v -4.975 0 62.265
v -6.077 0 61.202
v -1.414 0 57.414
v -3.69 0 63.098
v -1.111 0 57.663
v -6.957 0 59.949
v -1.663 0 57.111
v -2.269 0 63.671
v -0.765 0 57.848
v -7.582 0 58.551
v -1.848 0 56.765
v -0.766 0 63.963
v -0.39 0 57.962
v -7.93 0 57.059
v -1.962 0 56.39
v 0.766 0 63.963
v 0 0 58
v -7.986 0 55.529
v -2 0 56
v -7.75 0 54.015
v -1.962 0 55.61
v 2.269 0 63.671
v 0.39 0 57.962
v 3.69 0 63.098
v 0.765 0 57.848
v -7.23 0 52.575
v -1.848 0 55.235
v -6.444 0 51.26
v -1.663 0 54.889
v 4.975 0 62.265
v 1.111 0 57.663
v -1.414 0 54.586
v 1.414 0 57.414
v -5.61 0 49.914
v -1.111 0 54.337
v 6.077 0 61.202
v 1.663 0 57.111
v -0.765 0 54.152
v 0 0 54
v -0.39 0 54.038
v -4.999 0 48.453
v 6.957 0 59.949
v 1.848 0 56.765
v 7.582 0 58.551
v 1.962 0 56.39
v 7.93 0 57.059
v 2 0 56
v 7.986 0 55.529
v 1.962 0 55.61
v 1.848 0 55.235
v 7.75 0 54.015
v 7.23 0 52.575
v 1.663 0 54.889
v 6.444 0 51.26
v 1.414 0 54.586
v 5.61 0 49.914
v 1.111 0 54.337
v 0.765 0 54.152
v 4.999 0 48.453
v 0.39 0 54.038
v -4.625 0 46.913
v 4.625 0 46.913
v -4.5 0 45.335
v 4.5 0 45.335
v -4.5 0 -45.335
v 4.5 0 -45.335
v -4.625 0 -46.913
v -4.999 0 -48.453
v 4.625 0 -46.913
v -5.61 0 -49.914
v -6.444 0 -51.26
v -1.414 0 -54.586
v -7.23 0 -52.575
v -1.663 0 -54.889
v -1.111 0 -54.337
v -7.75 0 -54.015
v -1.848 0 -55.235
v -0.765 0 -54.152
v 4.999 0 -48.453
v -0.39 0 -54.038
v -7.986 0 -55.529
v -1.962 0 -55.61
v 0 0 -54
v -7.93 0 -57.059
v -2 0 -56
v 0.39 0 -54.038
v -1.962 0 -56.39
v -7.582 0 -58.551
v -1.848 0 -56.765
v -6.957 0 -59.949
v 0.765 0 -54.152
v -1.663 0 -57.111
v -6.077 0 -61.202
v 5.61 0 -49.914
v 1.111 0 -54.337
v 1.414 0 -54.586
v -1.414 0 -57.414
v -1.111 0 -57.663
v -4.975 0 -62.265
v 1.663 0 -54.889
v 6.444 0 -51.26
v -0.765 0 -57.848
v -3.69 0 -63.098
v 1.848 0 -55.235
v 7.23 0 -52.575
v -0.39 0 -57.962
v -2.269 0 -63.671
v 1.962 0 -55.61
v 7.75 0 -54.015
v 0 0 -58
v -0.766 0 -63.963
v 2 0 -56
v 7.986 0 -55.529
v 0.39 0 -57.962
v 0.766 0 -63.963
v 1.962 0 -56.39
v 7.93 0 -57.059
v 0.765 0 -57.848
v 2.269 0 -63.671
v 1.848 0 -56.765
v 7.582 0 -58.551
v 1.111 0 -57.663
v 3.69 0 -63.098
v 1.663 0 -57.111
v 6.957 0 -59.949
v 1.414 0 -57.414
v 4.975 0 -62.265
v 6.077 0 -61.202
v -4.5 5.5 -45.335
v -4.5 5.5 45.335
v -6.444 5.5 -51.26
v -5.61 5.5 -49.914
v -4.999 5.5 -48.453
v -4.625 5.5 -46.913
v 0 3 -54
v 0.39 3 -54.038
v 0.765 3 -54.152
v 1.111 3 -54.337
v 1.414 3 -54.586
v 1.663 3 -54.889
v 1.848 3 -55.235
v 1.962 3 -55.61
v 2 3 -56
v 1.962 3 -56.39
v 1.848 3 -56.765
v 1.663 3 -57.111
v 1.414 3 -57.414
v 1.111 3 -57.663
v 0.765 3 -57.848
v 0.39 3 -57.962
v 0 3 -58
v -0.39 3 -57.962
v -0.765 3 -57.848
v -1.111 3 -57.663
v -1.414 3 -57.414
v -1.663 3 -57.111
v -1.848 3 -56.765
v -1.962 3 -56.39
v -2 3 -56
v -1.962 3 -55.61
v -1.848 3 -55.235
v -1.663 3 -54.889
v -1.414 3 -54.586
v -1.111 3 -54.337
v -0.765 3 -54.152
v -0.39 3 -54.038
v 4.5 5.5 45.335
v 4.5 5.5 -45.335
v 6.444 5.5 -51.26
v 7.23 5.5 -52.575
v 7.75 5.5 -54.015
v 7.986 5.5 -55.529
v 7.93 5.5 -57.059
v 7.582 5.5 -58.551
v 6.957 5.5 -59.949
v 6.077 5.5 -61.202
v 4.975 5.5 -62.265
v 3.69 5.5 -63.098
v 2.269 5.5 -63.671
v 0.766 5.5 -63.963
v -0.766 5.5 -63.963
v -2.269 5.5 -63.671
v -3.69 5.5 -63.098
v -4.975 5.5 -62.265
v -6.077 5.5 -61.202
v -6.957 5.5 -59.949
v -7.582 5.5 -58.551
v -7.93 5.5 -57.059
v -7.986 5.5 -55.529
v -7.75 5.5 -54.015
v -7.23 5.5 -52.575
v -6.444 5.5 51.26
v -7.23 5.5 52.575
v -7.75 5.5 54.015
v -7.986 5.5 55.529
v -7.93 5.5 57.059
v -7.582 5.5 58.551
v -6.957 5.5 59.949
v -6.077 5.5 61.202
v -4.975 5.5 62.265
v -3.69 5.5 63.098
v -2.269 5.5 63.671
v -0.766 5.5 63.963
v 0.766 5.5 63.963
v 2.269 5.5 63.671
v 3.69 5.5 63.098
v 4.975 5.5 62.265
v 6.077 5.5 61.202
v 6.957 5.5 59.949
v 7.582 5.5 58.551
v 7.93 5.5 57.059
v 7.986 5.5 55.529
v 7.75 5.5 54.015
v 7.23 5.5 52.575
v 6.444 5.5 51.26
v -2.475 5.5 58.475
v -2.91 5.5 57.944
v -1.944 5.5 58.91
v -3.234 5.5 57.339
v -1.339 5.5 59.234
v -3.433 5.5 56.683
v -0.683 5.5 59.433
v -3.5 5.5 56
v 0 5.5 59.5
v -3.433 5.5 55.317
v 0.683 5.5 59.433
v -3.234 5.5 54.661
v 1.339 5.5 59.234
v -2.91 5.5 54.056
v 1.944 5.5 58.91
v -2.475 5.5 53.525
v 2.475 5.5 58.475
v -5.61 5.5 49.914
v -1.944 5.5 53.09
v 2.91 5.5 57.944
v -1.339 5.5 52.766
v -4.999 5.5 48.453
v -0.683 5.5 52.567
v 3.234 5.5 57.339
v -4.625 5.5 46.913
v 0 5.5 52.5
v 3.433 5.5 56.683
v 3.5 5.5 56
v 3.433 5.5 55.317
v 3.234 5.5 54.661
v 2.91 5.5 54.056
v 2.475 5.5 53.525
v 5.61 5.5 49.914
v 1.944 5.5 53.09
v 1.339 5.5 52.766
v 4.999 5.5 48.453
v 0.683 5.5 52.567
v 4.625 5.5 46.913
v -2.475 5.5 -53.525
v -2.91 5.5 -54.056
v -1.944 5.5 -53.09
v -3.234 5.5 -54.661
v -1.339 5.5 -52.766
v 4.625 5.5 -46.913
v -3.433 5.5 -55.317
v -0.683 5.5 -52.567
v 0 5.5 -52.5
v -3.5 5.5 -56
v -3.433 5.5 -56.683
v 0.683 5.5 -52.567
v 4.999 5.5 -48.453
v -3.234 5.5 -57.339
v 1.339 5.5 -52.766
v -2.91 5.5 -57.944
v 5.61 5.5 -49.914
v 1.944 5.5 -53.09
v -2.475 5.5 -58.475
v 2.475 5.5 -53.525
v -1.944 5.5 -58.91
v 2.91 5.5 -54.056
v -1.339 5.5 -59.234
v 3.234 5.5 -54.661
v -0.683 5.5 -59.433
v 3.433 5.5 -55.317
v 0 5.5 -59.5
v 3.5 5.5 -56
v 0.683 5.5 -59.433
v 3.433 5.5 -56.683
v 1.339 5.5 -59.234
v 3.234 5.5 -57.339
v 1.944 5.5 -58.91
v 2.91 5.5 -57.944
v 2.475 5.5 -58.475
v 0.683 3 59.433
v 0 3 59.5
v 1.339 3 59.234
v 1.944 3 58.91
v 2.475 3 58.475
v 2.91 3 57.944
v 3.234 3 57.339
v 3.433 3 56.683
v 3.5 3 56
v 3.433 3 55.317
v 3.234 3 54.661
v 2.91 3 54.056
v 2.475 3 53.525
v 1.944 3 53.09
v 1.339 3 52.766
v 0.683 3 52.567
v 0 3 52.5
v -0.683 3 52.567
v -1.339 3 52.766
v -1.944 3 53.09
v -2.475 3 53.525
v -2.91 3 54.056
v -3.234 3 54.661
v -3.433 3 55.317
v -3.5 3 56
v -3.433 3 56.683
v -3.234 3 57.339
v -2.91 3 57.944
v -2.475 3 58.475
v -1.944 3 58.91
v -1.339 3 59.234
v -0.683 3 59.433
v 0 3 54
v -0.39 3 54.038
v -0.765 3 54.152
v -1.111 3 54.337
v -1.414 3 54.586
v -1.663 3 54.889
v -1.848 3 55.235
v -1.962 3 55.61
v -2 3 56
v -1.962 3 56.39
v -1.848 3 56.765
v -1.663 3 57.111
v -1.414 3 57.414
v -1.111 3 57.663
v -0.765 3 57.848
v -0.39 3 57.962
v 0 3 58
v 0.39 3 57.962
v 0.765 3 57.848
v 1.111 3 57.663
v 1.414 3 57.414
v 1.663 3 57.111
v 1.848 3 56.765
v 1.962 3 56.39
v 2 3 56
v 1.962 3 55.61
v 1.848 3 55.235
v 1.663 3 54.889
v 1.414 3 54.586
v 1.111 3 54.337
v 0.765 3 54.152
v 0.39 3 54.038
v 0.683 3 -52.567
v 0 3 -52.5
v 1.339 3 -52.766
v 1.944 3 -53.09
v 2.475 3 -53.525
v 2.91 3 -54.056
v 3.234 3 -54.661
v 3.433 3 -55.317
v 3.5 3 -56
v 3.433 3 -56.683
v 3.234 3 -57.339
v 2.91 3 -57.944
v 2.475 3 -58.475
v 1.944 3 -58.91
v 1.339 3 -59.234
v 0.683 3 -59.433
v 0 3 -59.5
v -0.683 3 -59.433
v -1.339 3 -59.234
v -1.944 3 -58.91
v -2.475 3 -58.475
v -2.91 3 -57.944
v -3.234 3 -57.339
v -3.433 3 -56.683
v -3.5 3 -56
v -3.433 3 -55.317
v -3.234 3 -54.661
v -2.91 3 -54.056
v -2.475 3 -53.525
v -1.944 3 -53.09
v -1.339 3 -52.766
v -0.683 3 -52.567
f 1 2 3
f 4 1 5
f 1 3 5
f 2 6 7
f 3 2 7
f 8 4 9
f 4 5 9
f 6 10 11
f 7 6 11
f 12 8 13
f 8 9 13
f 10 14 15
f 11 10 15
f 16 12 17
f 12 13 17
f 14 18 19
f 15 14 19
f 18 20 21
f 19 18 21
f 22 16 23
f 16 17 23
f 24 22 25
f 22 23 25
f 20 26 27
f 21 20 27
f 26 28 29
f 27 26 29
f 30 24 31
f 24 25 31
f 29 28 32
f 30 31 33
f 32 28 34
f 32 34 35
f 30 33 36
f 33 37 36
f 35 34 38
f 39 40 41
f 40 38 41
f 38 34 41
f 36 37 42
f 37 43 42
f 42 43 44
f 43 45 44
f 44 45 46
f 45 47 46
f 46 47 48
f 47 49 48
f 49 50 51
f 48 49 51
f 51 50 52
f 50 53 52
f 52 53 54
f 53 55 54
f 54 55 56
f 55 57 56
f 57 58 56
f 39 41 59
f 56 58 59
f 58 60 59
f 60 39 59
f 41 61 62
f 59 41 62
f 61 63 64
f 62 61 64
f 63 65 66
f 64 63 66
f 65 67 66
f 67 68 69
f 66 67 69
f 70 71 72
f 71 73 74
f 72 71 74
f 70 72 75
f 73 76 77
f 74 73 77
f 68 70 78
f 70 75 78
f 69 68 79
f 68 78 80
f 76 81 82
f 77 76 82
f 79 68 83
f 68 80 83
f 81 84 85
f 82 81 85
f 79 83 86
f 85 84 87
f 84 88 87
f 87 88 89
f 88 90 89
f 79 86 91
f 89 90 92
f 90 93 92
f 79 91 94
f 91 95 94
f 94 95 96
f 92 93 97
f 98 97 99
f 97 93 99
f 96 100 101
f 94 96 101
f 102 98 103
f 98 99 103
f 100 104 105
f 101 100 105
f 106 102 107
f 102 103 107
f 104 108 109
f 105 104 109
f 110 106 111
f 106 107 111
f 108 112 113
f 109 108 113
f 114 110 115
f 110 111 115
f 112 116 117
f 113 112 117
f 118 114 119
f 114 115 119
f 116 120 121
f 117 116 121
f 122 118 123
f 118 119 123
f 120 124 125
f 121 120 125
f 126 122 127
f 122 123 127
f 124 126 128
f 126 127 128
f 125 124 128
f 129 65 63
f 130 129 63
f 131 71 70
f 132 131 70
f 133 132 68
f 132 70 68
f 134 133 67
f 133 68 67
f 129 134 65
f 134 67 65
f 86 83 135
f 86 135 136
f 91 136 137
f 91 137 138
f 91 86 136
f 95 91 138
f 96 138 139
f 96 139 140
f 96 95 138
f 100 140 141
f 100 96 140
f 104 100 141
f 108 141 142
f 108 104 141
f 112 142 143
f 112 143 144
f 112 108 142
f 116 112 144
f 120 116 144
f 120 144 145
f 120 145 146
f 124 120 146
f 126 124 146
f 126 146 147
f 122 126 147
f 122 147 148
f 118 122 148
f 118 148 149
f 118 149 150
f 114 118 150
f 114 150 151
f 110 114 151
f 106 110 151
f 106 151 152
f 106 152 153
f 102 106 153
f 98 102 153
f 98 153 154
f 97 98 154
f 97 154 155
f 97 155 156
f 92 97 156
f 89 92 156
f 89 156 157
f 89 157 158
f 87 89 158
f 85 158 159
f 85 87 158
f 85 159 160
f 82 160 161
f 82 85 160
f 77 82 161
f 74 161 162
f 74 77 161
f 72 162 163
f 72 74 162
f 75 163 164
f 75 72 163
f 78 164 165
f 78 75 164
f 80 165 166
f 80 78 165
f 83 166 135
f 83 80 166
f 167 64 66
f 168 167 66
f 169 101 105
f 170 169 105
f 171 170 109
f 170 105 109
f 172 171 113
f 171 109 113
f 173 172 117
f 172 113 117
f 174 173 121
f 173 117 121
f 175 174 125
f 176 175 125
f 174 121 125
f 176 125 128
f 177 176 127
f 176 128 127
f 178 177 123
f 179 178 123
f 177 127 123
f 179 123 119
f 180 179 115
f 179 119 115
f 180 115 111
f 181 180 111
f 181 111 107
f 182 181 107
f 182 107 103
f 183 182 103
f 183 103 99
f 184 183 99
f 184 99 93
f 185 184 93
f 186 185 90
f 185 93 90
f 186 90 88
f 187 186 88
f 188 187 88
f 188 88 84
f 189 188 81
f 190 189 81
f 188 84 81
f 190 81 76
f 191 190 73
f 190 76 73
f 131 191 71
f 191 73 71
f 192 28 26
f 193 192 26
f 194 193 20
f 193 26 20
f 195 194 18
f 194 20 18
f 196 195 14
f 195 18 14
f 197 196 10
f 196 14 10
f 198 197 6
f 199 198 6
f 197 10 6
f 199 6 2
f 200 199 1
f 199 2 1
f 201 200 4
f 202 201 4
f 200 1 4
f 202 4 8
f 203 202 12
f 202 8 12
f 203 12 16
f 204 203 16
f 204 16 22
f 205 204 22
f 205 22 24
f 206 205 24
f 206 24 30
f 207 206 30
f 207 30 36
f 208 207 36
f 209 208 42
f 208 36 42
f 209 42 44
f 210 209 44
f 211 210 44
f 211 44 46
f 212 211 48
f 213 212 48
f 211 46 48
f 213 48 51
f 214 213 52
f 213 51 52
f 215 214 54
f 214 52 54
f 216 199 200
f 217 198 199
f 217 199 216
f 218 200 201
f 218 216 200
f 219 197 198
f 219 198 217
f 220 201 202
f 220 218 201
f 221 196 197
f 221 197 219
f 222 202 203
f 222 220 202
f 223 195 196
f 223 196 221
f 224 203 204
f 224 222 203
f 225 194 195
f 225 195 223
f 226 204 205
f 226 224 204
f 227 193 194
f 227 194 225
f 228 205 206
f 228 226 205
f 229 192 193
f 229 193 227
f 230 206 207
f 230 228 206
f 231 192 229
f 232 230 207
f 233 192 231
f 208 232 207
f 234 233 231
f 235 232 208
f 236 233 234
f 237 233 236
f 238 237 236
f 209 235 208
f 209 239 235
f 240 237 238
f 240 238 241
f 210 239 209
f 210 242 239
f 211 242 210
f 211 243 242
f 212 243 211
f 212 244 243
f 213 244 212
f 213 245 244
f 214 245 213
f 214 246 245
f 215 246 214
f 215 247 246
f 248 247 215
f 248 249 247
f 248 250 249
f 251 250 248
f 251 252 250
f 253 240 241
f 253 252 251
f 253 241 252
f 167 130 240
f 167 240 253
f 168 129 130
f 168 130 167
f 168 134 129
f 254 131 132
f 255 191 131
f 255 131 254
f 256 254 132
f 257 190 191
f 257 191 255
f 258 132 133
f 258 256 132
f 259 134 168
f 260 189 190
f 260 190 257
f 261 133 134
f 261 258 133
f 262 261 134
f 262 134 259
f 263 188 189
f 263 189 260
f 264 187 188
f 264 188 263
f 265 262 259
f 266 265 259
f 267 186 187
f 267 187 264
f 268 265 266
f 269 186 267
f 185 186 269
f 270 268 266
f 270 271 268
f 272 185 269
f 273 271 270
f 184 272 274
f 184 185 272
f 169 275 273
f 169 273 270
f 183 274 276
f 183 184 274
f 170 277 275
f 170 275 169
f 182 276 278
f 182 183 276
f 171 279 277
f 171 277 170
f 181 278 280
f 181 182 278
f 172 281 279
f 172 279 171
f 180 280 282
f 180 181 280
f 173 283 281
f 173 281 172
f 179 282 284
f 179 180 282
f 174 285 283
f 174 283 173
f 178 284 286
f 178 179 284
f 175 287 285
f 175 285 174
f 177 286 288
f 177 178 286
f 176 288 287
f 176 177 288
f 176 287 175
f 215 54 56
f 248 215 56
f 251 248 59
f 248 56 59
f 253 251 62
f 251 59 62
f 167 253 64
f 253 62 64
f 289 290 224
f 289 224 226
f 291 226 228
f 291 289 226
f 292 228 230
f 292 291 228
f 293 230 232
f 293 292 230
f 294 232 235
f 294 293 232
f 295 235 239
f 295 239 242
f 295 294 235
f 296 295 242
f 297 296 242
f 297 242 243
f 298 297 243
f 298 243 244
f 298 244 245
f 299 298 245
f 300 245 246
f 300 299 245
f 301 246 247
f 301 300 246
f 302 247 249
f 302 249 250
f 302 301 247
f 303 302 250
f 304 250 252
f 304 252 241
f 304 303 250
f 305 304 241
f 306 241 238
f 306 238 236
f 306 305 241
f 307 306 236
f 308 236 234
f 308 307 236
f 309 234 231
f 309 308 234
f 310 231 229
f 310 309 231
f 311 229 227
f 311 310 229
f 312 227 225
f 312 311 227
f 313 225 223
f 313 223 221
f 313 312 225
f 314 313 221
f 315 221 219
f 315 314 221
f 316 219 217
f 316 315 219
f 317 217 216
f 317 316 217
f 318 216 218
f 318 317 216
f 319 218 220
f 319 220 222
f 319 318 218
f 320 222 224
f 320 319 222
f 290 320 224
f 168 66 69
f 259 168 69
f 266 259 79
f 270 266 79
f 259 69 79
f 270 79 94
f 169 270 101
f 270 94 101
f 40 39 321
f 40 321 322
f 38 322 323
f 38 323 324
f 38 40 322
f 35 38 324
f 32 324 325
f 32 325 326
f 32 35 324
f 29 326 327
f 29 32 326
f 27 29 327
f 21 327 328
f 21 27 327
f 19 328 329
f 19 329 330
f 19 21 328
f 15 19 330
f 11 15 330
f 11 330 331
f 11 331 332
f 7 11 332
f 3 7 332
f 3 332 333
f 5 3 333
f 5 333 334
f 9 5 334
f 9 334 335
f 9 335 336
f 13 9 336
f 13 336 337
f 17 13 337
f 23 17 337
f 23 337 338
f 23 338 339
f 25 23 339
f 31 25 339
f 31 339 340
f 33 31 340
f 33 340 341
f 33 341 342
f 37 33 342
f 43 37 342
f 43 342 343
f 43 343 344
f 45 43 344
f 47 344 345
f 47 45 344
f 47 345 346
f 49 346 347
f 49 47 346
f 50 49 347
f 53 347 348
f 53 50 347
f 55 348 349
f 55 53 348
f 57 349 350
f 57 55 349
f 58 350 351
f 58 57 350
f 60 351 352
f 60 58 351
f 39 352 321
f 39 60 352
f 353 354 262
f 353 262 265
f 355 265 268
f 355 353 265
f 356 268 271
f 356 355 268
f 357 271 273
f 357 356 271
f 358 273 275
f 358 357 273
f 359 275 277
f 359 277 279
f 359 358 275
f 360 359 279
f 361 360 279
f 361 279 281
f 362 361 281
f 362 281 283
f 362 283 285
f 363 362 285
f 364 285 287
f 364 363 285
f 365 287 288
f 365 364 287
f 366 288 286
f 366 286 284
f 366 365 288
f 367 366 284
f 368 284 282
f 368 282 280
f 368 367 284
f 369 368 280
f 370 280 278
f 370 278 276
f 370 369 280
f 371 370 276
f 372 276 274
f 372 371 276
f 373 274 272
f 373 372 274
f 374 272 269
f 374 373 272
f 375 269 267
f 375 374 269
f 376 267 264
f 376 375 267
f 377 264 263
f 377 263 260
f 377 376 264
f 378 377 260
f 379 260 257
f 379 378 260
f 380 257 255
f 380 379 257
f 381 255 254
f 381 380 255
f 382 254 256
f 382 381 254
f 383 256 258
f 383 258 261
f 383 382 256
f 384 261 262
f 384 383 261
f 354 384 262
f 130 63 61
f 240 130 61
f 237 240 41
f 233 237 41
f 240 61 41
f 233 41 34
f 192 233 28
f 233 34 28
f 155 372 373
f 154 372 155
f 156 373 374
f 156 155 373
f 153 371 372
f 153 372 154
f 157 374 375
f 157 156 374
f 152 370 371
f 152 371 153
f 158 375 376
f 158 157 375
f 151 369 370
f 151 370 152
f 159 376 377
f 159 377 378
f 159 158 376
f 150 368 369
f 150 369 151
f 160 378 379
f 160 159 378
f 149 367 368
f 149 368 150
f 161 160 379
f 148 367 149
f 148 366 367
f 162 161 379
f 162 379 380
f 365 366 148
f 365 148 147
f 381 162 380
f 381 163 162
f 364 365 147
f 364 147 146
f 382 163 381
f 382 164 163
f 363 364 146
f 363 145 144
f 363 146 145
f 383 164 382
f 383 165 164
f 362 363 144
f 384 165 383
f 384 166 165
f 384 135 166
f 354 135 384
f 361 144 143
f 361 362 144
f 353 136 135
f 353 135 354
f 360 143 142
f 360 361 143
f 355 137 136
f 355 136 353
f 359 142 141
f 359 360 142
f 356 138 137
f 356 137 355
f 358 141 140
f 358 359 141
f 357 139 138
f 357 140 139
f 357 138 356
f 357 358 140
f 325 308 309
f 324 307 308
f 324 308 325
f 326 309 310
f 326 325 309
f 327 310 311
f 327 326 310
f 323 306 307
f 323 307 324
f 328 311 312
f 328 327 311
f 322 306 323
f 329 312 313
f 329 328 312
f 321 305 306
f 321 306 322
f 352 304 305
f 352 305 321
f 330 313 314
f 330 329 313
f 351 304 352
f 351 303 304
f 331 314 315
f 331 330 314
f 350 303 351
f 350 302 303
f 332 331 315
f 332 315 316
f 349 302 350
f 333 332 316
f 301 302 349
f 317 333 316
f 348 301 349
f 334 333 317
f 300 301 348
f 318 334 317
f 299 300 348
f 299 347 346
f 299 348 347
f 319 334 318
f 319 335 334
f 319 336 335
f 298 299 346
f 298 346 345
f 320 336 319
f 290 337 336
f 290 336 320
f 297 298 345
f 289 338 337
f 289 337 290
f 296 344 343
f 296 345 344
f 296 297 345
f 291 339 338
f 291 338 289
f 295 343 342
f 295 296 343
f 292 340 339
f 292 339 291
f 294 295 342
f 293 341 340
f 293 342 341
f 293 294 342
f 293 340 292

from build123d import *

# Parameters (mm, degrees)
SKETCH1_R           = 2
BOSS_EXTRUDE1_DEPTH = 5.5
CUT_EXTRUDE1_START  = -2.5
SKETCH2_R           = 3.5
SKETCH2_R_2         = 2
CUT_EXTRUDE1_DEPTH  = 2.5


with BuildPart() as part:
    # Sketch1 → Boss-Extrude1 (new body)
    with BuildSketch(Plane(origin=(0, 0, 0), x_dir=(1, 0, 0), z_dir=(0, 1, 0))):
        with BuildLine():
            Line((-4.5, 45.334635496), (-4.5, -45.334635496))
            ThreePointArc((-4.5, -45.334635496), (-4.998538124, -48.452683318), (-6.444444444, -51.259837998))
            ThreePointArc((-6.444444444, -51.259837998), (0, -64), (6.444444444, -51.259837998))
            ThreePointArc((6.444444444, -51.259837998), (4.998538124, -48.452683318), (4.5, -45.334635496))
            Line((4.5, -45.334635496), (4.5, 45.334635496))
            ThreePointArc((4.5, 45.334635496), (4.998538124, 48.452683318), (6.444444444, 51.259837998))
            ThreePointArc((6.444444444, 51.259837998), (0, 64), (-6.444444444, 51.259837998))
            ThreePointArc((-6.444444444, 51.259837998), (-4.998538124, 48.452683318), (-4.5, 45.334635496))
        make_face()
        with Locations(Location((0, 56, 0), (0, 0, 270))):
            Circle(SKETCH1_R, mode=Mode.SUBTRACT)
        with Locations(Location((0, -56, 0), (0, 0, 90))):
            Circle(SKETCH1_R, mode=Mode.SUBTRACT)
    extrude(amount=BOSS_EXTRUDE1_DEPTH)

    # Sketch2 → Cut-Extrude1 (cut)
    # profile 1 of 2: a face of its own
    with BuildSketch(Plane(origin=(0, 5.5, 0), x_dir=(1, 0, 0), z_dir=(0, 1, 0)).offset(CUT_EXTRUDE1_START)):
        with Locations(Location((0, 56, 0), (0, 0, 270))):
            Circle(SKETCH2_R)
        with Locations(Location((0, 56, 0), (0, 0, 270))):
            Circle(SKETCH2_R_2, mode=Mode.SUBTRACT)
    # profile 2 of 2: a face of its own
    with BuildSketch(Plane(origin=(0, 5.5, 0), x_dir=(1, 0, 0), z_dir=(0, 1, 0)).offset(CUT_EXTRUDE1_START)):
        with Locations(Location((0, -56, 0), (0, 0, 270))):
            Circle(SKETCH2_R)
        with Locations(Location((0, -56, 0), (0, 0, 90))):
            Circle(SKETCH2_R_2, mode=Mode.SUBTRACT)
    extrude(amount=CUT_EXTRUDE1_DEPTH, mode=Mode.SUBTRACT)


solid = part.part
